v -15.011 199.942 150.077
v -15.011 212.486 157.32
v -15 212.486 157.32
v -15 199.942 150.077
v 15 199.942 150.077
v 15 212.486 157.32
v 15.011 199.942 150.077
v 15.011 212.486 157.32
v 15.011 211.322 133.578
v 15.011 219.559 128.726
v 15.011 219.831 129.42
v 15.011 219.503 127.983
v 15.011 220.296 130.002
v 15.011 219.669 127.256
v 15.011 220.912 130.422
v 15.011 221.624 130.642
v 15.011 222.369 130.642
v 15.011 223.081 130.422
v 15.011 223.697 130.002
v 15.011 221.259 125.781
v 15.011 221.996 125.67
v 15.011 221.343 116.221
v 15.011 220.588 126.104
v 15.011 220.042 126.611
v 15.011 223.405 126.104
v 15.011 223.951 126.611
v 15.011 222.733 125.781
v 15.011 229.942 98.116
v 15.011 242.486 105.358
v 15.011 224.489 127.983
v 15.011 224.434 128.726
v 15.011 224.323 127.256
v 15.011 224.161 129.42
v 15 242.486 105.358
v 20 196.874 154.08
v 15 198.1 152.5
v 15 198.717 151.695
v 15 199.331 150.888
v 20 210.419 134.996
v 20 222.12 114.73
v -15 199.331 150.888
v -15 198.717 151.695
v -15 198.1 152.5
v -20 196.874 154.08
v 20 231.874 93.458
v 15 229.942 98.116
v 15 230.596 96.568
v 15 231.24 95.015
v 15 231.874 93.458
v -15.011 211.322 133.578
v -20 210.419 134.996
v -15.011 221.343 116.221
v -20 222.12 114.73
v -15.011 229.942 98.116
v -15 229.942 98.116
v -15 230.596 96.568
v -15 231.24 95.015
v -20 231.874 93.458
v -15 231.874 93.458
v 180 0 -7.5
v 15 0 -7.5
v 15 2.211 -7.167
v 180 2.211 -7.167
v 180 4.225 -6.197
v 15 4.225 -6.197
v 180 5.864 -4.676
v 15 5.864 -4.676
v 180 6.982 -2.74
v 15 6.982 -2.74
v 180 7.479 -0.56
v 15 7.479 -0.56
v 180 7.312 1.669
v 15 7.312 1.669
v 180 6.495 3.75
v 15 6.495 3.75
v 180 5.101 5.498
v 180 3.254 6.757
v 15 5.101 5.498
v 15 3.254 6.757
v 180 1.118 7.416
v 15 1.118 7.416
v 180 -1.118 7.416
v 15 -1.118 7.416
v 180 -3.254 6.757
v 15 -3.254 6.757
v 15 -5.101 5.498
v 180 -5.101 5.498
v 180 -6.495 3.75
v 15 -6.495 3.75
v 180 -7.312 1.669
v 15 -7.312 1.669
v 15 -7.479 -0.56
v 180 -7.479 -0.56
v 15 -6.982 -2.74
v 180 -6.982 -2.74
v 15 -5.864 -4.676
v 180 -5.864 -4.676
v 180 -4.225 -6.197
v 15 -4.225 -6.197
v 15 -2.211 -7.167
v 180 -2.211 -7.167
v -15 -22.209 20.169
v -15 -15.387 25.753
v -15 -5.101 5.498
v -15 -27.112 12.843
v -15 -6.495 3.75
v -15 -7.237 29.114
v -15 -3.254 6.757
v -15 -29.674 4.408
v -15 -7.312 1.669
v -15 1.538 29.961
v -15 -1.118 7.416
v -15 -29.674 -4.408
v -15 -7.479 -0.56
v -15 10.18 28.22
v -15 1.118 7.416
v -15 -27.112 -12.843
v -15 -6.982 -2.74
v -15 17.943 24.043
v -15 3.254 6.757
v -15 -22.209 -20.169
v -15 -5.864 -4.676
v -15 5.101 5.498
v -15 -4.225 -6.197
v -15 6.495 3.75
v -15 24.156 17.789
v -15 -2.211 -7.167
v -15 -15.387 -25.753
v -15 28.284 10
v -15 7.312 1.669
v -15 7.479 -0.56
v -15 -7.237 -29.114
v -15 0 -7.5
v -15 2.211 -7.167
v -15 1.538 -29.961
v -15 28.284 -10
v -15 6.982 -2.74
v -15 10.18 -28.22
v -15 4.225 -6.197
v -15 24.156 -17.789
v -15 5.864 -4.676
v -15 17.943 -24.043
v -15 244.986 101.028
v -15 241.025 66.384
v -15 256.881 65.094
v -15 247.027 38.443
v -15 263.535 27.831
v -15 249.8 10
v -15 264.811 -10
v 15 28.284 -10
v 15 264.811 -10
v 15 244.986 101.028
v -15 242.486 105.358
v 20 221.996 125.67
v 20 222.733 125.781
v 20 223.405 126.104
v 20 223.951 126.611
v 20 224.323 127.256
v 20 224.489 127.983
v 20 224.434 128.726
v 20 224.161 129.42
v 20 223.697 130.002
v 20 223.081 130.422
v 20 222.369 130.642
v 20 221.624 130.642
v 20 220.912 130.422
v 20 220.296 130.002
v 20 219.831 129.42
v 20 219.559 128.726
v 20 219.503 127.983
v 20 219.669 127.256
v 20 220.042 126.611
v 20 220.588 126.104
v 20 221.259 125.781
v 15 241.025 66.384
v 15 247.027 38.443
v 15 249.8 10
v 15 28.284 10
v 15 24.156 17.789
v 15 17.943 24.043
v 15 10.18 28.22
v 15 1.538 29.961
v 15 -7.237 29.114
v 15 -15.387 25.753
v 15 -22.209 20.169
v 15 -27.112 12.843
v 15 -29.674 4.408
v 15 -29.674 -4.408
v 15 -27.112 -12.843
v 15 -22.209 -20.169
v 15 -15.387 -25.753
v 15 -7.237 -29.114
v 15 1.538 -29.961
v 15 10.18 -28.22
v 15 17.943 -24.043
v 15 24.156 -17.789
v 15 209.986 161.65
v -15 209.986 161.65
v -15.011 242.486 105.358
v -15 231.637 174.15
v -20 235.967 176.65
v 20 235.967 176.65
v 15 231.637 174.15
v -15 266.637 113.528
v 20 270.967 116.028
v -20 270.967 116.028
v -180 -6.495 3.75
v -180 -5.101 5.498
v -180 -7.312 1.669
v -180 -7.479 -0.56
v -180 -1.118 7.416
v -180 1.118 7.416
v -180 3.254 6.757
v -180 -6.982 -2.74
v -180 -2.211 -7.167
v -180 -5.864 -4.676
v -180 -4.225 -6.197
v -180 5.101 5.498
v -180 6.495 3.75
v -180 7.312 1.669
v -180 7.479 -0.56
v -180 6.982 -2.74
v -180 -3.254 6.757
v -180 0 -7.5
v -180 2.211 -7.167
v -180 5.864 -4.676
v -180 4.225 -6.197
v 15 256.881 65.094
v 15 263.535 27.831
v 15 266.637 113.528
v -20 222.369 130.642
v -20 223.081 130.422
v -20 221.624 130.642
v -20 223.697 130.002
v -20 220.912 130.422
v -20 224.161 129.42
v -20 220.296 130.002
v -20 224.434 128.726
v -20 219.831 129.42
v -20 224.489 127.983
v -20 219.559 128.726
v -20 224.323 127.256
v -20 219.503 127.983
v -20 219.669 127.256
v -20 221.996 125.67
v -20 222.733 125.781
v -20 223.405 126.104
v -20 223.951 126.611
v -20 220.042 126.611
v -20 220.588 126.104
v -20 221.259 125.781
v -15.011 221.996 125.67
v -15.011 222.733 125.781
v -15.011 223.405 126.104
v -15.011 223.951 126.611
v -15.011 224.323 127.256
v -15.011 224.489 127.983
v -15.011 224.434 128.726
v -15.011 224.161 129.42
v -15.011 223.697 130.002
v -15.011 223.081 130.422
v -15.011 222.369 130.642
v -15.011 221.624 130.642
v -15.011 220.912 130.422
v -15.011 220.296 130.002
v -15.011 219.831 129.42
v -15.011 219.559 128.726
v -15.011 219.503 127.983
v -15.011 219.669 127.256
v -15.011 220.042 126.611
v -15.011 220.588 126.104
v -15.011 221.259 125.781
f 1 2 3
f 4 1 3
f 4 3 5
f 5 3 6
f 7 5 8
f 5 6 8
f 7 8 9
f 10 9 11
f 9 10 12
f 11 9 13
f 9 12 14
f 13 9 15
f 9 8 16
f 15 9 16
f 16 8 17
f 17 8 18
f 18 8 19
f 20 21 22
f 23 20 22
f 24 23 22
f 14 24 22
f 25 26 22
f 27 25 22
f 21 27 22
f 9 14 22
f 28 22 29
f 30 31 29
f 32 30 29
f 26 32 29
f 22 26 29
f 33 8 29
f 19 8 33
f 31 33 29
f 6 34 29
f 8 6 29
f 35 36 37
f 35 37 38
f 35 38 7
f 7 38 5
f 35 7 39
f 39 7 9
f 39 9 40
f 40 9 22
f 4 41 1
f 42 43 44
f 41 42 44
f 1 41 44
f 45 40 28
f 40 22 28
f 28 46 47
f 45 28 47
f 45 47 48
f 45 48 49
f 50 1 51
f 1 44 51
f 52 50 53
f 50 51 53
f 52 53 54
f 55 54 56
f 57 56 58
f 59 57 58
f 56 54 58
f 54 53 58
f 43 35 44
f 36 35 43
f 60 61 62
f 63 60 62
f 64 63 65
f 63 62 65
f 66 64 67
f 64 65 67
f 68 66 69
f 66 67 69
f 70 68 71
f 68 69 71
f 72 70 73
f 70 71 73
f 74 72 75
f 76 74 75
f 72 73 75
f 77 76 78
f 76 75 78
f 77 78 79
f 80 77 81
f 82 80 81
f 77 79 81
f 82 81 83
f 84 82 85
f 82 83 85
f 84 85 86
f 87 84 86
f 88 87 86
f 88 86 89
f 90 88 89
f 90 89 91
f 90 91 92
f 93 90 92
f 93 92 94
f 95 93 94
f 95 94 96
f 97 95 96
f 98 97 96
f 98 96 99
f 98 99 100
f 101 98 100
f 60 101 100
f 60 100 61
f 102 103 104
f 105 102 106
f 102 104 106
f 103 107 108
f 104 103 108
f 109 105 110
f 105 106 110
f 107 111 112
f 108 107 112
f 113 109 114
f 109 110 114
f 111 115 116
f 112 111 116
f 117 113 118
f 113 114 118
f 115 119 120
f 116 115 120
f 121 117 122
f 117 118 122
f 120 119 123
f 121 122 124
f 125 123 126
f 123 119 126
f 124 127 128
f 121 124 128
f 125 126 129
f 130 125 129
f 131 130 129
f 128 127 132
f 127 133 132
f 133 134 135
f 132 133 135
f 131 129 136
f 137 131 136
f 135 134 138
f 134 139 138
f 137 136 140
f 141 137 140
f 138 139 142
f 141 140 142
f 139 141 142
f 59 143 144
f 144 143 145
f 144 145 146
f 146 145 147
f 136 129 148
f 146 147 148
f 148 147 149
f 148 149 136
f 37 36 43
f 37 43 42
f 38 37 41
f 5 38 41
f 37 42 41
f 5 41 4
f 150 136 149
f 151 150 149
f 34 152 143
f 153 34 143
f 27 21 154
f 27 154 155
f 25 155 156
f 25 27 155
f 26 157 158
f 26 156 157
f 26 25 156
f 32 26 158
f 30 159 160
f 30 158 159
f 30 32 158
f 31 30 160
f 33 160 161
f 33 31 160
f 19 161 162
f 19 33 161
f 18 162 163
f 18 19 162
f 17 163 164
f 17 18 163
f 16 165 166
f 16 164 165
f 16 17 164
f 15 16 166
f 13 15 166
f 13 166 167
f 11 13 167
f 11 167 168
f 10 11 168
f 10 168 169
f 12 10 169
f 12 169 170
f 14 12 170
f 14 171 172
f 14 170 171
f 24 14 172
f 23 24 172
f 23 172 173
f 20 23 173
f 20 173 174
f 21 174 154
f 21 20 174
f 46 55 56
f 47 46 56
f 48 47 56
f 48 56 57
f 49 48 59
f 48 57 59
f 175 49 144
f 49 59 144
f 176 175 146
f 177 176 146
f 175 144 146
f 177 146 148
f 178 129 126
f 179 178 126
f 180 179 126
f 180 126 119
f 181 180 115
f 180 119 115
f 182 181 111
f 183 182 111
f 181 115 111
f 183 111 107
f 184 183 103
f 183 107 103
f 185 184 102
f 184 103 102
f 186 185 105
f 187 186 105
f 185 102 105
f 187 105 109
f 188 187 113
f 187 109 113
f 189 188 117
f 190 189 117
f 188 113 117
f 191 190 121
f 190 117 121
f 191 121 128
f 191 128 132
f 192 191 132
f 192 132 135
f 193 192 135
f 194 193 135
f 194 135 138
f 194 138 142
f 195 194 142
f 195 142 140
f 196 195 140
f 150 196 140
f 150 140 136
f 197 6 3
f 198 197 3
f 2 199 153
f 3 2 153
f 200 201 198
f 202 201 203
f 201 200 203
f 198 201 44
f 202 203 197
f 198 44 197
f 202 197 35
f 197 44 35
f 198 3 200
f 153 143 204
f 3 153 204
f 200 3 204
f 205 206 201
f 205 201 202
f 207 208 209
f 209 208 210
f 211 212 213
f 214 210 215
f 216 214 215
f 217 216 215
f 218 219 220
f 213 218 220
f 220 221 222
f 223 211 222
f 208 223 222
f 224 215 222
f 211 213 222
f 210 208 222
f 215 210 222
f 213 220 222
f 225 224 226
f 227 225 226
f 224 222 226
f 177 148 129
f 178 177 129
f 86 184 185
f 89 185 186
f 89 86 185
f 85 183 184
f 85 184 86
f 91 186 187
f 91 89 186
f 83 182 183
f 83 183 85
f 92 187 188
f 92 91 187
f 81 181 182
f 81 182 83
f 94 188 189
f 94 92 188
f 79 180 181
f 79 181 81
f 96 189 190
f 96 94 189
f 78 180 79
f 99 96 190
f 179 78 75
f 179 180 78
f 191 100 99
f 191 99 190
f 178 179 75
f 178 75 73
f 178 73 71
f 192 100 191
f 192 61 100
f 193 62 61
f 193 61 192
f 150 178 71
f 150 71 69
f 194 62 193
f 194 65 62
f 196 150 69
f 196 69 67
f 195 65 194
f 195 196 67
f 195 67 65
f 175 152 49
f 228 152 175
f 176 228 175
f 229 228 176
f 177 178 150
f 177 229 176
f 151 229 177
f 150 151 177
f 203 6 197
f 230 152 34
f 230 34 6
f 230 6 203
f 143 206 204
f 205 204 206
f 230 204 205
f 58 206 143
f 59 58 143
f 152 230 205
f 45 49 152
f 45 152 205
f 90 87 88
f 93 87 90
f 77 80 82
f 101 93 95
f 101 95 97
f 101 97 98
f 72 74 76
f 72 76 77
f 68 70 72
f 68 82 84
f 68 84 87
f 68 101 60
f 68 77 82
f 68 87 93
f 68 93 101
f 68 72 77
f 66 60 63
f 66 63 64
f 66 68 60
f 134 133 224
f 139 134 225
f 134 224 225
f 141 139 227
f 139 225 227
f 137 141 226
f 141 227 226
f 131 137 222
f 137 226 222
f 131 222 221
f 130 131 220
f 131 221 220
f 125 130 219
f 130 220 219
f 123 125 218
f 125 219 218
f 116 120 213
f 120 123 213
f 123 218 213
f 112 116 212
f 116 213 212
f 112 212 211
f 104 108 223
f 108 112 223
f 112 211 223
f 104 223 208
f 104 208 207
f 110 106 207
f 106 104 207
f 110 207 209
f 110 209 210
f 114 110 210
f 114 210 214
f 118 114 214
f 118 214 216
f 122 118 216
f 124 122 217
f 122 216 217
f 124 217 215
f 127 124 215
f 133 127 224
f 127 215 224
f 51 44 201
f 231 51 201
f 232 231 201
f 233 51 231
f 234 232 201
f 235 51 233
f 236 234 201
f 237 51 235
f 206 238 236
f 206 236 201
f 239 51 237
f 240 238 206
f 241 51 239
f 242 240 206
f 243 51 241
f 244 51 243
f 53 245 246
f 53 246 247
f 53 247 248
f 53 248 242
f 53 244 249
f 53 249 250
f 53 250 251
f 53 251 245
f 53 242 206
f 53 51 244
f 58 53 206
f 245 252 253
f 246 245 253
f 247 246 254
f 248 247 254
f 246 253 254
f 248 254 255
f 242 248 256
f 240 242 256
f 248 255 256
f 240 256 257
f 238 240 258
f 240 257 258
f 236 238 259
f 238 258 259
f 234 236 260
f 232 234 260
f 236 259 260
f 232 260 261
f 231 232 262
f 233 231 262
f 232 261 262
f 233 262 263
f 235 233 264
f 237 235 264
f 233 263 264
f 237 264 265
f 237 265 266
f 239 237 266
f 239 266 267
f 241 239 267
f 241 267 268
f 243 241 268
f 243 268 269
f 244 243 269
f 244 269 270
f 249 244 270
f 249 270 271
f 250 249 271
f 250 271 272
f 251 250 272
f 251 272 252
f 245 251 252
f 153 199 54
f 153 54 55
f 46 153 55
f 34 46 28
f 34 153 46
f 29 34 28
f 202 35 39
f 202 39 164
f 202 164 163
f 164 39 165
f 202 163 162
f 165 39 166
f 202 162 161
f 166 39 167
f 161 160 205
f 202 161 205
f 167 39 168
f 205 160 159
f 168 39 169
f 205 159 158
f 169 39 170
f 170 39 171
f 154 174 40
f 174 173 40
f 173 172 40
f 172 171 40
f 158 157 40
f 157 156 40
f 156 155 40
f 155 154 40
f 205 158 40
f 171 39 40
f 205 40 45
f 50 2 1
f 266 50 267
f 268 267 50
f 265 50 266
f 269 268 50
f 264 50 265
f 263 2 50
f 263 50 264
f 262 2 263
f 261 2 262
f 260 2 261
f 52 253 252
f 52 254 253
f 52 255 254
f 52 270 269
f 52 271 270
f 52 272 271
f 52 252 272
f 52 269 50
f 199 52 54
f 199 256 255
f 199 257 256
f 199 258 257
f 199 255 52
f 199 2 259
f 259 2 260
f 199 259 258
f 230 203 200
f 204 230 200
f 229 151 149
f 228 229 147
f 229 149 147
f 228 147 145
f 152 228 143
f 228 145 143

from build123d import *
from build123d.topology import SkipClean

# Parameters (mm, degrees)
BOSS_EXTRUDE1_DEPTH             = 15
BOSS_EXTRUDE1_DEPTH_BACK        = 15
BOSS_EXTRUDE3_REACH             = 306.228
BOSS_EXTRUDE3_END_RADIUS        = 250
SKETCH5_W                       = 40
SKETCH5_H                       = 70
BOSS_EXTRUDE3_DIRECTION_2_DEPTH = 30
SKETCH6_W                       = 30
SKETCH6_H                       = 25
CUT_EXTRUDE2_DEPTH              = 70
CUT_EXTRUDE3_REACH              = 306.515
CUT_EXTRUDE3_END_RADIUS         = 250
SKETCH7_W                       = 30.021890818
SKETCH7_H                       = 60
CUT_EXTRUDE4_REACH              = 327.352
SKETCH8_R                       = 2.5
CUT_EXTRUDE4_DIRECTION_2_REACH  = 327.352
BOSS_EXTRUDE4_DEPTH             = 180
BOSS_EXTRUDE4_DEPTH_BACK        = 180
SKETCH11_R                      = 7.5


with BuildPart() as part:
    # Sketch1 → Boss-Extrude1 (new, two sides: drawn at the far end of the back side and taken through both)
    with BuildSketch(Plane(origin=(0, 0, 0), x_dir=(0, 0, -1), z_dir=(1, 0, 0)).offset(-BOSS_EXTRUDE1_DEPTH_BACK)):
        with BuildLine():
            Line((10, 28.284271247), (10, 264.811253537))
            ThreePointArc((10, 264.811253537), (-46.581095136, 260.873918926), (-101.028366233, 244.986263322))
            Line((-101.028366233, 244.986263322), (-161.650144498, 209.986263322))
            Line((-161.650144498, 209.986263322), (-152.500136319, 198.100248417))
            ThreePointArc((-152.500136319, 198.100248417), (-85.263049352, 235.011089984), (-10, 249.799919936))
            Line((-10, 249.799919936), (-10, 28.284271247))
            ThreePointArc((-10, 28.284271247), (0, -30), (10, 28.284271247))
        make_face()
    extrude(amount=BOSS_EXTRUDE1_DEPTH + BOSS_EXTRUDE1_DEPTH_BACK)

    # Boss-Extrude3: up to this cylinder (the profile starts outside it)
    with SkipClean():  # the faces are left unmerged after this step: merging them gives an invalid solid
        boss_extrude3_end = Plane(origin=(0, 0, 0), z_dir=(-1, 0, 0)) * Cylinder(BOSS_EXTRUDE3_END_RADIUS, 1113.456, mode=Mode.PRIVATE)
        # Sketch5 → Boss-Extrude3 (add, up to the surface)
        with BuildSketch(Plane(origin=(0, 227.486263322, 131.339255366), x_dir=(1, 0, 0), z_dir=(0, 0.8660254037844353, 0.5000000000000059)), mode=Mode.PRIVATE) as boss_extrude3_sk1:
            Rectangle(SKETCH5_W, SKETCH5_H)
        boss_extrude3_tool1 = extrude(boss_extrude3_sk1.sketch, amount=-BOSS_EXTRUDE3_REACH, mode=Mode.PRIVATE) - boss_extrude3_end
        add(boss_extrude3_tool1.solids().sort_by_distance((0, 227.486263, 131.339255))[0])

    # Sketch5 → Boss-Extrude3 direction 2 (add)
    with SkipClean():  # the faces are left unmerged after this step: merging them gives an invalid solid
        with BuildSketch(Plane(origin=(0, 227.486263322, 131.339255366), x_dir=(1, 0, 0), z_dir=(0, 0.8660254037844353, 0.5000000000000059))):
            Rectangle(SKETCH5_W, SKETCH5_H)
        extrude(amount=BOSS_EXTRUDE3_DIRECTION_2_DEPTH)

    # Sketch6 → Cut-Extrude2 (cut)
    with SkipClean():  # the faces are left unmerged after this step: merging them gives an invalid solid
        with BuildSketch(Plane(origin=(0, 17.5, -30.310889132), x_dir=(-1, 0, 0), z_dir=(0, 0.5000000000000059, -0.8660254037844353))):
            with Locations((0, 275.178510731)):
                Rectangle(SKETCH6_W, SKETCH6_H)
        extrude(amount=-CUT_EXTRUDE2_DEPTH, mode=Mode.SUBTRACT)

    # Cut-Extrude3: up to this cylinder (the profile starts outside it)
    cut_extrude3_end = Plane(origin=(0, 0, 0), z_dir=(-1, 0, 0)) * Cylinder(CUT_EXTRUDE3_END_RADIUS, 1114.03, mode=Mode.PRIVATE)
    # Sketch7 → Cut-Extrude3 (cut, up to the surface)
    with BuildSketch(Plane(origin=(0, 227.486263322, 131.339255366), x_dir=(1, 0, 0), z_dir=(0, 0.8660254037844353, 0.5000000000000059)), mode=Mode.PRIVATE) as cut_extrude3_sk1:
        Rectangle(SKETCH7_W, SKETCH7_H)
    cut_extrude3_tool1 = extrude(cut_extrude3_sk1.sketch, amount=-CUT_EXTRUDE3_REACH, mode=Mode.PRIVATE) - cut_extrude3_end
    add(cut_extrude3_tool1.solids().sort_by_distance((0, 227.486263, 131.339255))[0], mode=Mode.SUBTRACT)

    # Cut-Extrude4: up to this face of the body (flat: up to its plane)
    cut_extrude4_end = Plane(part.part.faces().sort_by_distance((-20, 234.626657577, 135.461763911))[0])
    # Sketch8 → Cut-Extrude4 (cut, up to the picked face)
    with BuildSketch(Plane(origin=(-15.010945409, 0, 0), x_dir=(0, 0, -1), z_dir=(1, 0, 0)), mode=Mode.PRIVATE) as cut_extrude4_sk1:
        with Locations((-128.169627683, 221.996307134)):
            Circle(SKETCH8_R)
    cut_extrude4_tool1 = split(extrude(cut_extrude4_sk1.sketch, amount=-CUT_EXTRUDE4_REACH, mode=Mode.PRIVATE), bisect_by=cut_extrude4_end, keep=Keep.BOTH, mode=Mode.PRIVATE)
    add(cut_extrude4_tool1.solids().sort_by(Axis((-15.010945, 221.996307, 128.169628), (-1, 0, 0)))[0], mode=Mode.SUBTRACT)

    # Cut-Extrude4 direction 2: up to this face of the body (flat: up to its plane)
    cut_extrude4_direction_2_end = Plane(part.part.faces().sort_by_distance((20, 234.626657577, 135.461763911))[0])
    # Sketch8 → Cut-Extrude4 direction 2 (cut, up to the picked face)
    with BuildSketch(Plane(origin=(-15.010945409, 0, 0), x_dir=(0, 0, -1), z_dir=(1, 0, 0)), mode=Mode.PRIVATE) as cut_extrude4_direction_2_sk1:
        with Locations((-128.169627683, 221.996307134)):
            Circle(SKETCH8_R)
    cut_extrude4_direction_2_tool1 = split(extrude(cut_extrude4_direction_2_sk1.sketch, amount=CUT_EXTRUDE4_DIRECTION_2_REACH, mode=Mode.PRIVATE), bisect_by=cut_extrude4_direction_2_end, keep=Keep.BOTH, mode=Mode.PRIVATE)
    add(cut_extrude4_direction_2_tool1.solids().sort_by(Axis((-15.010945, 221.996307, 128.169628), (1, 0, 0)))[0], mode=Mode.SUBTRACT)

    # Sketch11 → Boss-Extrude4 (add, two sides: drawn at the far end of the back side and taken through both)
    with BuildSketch(Plane(origin=(0, 0, 0), x_dir=(0, 0, -1), z_dir=(1, 0, 0)).offset(-BOSS_EXTRUDE4_DEPTH_BACK)):
        Circle(SKETCH11_R)
    extrude(amount=BOSS_EXTRUDE4_DEPTH + BOSS_EXTRUDE4_DEPTH_BACK)


solid = part.part
